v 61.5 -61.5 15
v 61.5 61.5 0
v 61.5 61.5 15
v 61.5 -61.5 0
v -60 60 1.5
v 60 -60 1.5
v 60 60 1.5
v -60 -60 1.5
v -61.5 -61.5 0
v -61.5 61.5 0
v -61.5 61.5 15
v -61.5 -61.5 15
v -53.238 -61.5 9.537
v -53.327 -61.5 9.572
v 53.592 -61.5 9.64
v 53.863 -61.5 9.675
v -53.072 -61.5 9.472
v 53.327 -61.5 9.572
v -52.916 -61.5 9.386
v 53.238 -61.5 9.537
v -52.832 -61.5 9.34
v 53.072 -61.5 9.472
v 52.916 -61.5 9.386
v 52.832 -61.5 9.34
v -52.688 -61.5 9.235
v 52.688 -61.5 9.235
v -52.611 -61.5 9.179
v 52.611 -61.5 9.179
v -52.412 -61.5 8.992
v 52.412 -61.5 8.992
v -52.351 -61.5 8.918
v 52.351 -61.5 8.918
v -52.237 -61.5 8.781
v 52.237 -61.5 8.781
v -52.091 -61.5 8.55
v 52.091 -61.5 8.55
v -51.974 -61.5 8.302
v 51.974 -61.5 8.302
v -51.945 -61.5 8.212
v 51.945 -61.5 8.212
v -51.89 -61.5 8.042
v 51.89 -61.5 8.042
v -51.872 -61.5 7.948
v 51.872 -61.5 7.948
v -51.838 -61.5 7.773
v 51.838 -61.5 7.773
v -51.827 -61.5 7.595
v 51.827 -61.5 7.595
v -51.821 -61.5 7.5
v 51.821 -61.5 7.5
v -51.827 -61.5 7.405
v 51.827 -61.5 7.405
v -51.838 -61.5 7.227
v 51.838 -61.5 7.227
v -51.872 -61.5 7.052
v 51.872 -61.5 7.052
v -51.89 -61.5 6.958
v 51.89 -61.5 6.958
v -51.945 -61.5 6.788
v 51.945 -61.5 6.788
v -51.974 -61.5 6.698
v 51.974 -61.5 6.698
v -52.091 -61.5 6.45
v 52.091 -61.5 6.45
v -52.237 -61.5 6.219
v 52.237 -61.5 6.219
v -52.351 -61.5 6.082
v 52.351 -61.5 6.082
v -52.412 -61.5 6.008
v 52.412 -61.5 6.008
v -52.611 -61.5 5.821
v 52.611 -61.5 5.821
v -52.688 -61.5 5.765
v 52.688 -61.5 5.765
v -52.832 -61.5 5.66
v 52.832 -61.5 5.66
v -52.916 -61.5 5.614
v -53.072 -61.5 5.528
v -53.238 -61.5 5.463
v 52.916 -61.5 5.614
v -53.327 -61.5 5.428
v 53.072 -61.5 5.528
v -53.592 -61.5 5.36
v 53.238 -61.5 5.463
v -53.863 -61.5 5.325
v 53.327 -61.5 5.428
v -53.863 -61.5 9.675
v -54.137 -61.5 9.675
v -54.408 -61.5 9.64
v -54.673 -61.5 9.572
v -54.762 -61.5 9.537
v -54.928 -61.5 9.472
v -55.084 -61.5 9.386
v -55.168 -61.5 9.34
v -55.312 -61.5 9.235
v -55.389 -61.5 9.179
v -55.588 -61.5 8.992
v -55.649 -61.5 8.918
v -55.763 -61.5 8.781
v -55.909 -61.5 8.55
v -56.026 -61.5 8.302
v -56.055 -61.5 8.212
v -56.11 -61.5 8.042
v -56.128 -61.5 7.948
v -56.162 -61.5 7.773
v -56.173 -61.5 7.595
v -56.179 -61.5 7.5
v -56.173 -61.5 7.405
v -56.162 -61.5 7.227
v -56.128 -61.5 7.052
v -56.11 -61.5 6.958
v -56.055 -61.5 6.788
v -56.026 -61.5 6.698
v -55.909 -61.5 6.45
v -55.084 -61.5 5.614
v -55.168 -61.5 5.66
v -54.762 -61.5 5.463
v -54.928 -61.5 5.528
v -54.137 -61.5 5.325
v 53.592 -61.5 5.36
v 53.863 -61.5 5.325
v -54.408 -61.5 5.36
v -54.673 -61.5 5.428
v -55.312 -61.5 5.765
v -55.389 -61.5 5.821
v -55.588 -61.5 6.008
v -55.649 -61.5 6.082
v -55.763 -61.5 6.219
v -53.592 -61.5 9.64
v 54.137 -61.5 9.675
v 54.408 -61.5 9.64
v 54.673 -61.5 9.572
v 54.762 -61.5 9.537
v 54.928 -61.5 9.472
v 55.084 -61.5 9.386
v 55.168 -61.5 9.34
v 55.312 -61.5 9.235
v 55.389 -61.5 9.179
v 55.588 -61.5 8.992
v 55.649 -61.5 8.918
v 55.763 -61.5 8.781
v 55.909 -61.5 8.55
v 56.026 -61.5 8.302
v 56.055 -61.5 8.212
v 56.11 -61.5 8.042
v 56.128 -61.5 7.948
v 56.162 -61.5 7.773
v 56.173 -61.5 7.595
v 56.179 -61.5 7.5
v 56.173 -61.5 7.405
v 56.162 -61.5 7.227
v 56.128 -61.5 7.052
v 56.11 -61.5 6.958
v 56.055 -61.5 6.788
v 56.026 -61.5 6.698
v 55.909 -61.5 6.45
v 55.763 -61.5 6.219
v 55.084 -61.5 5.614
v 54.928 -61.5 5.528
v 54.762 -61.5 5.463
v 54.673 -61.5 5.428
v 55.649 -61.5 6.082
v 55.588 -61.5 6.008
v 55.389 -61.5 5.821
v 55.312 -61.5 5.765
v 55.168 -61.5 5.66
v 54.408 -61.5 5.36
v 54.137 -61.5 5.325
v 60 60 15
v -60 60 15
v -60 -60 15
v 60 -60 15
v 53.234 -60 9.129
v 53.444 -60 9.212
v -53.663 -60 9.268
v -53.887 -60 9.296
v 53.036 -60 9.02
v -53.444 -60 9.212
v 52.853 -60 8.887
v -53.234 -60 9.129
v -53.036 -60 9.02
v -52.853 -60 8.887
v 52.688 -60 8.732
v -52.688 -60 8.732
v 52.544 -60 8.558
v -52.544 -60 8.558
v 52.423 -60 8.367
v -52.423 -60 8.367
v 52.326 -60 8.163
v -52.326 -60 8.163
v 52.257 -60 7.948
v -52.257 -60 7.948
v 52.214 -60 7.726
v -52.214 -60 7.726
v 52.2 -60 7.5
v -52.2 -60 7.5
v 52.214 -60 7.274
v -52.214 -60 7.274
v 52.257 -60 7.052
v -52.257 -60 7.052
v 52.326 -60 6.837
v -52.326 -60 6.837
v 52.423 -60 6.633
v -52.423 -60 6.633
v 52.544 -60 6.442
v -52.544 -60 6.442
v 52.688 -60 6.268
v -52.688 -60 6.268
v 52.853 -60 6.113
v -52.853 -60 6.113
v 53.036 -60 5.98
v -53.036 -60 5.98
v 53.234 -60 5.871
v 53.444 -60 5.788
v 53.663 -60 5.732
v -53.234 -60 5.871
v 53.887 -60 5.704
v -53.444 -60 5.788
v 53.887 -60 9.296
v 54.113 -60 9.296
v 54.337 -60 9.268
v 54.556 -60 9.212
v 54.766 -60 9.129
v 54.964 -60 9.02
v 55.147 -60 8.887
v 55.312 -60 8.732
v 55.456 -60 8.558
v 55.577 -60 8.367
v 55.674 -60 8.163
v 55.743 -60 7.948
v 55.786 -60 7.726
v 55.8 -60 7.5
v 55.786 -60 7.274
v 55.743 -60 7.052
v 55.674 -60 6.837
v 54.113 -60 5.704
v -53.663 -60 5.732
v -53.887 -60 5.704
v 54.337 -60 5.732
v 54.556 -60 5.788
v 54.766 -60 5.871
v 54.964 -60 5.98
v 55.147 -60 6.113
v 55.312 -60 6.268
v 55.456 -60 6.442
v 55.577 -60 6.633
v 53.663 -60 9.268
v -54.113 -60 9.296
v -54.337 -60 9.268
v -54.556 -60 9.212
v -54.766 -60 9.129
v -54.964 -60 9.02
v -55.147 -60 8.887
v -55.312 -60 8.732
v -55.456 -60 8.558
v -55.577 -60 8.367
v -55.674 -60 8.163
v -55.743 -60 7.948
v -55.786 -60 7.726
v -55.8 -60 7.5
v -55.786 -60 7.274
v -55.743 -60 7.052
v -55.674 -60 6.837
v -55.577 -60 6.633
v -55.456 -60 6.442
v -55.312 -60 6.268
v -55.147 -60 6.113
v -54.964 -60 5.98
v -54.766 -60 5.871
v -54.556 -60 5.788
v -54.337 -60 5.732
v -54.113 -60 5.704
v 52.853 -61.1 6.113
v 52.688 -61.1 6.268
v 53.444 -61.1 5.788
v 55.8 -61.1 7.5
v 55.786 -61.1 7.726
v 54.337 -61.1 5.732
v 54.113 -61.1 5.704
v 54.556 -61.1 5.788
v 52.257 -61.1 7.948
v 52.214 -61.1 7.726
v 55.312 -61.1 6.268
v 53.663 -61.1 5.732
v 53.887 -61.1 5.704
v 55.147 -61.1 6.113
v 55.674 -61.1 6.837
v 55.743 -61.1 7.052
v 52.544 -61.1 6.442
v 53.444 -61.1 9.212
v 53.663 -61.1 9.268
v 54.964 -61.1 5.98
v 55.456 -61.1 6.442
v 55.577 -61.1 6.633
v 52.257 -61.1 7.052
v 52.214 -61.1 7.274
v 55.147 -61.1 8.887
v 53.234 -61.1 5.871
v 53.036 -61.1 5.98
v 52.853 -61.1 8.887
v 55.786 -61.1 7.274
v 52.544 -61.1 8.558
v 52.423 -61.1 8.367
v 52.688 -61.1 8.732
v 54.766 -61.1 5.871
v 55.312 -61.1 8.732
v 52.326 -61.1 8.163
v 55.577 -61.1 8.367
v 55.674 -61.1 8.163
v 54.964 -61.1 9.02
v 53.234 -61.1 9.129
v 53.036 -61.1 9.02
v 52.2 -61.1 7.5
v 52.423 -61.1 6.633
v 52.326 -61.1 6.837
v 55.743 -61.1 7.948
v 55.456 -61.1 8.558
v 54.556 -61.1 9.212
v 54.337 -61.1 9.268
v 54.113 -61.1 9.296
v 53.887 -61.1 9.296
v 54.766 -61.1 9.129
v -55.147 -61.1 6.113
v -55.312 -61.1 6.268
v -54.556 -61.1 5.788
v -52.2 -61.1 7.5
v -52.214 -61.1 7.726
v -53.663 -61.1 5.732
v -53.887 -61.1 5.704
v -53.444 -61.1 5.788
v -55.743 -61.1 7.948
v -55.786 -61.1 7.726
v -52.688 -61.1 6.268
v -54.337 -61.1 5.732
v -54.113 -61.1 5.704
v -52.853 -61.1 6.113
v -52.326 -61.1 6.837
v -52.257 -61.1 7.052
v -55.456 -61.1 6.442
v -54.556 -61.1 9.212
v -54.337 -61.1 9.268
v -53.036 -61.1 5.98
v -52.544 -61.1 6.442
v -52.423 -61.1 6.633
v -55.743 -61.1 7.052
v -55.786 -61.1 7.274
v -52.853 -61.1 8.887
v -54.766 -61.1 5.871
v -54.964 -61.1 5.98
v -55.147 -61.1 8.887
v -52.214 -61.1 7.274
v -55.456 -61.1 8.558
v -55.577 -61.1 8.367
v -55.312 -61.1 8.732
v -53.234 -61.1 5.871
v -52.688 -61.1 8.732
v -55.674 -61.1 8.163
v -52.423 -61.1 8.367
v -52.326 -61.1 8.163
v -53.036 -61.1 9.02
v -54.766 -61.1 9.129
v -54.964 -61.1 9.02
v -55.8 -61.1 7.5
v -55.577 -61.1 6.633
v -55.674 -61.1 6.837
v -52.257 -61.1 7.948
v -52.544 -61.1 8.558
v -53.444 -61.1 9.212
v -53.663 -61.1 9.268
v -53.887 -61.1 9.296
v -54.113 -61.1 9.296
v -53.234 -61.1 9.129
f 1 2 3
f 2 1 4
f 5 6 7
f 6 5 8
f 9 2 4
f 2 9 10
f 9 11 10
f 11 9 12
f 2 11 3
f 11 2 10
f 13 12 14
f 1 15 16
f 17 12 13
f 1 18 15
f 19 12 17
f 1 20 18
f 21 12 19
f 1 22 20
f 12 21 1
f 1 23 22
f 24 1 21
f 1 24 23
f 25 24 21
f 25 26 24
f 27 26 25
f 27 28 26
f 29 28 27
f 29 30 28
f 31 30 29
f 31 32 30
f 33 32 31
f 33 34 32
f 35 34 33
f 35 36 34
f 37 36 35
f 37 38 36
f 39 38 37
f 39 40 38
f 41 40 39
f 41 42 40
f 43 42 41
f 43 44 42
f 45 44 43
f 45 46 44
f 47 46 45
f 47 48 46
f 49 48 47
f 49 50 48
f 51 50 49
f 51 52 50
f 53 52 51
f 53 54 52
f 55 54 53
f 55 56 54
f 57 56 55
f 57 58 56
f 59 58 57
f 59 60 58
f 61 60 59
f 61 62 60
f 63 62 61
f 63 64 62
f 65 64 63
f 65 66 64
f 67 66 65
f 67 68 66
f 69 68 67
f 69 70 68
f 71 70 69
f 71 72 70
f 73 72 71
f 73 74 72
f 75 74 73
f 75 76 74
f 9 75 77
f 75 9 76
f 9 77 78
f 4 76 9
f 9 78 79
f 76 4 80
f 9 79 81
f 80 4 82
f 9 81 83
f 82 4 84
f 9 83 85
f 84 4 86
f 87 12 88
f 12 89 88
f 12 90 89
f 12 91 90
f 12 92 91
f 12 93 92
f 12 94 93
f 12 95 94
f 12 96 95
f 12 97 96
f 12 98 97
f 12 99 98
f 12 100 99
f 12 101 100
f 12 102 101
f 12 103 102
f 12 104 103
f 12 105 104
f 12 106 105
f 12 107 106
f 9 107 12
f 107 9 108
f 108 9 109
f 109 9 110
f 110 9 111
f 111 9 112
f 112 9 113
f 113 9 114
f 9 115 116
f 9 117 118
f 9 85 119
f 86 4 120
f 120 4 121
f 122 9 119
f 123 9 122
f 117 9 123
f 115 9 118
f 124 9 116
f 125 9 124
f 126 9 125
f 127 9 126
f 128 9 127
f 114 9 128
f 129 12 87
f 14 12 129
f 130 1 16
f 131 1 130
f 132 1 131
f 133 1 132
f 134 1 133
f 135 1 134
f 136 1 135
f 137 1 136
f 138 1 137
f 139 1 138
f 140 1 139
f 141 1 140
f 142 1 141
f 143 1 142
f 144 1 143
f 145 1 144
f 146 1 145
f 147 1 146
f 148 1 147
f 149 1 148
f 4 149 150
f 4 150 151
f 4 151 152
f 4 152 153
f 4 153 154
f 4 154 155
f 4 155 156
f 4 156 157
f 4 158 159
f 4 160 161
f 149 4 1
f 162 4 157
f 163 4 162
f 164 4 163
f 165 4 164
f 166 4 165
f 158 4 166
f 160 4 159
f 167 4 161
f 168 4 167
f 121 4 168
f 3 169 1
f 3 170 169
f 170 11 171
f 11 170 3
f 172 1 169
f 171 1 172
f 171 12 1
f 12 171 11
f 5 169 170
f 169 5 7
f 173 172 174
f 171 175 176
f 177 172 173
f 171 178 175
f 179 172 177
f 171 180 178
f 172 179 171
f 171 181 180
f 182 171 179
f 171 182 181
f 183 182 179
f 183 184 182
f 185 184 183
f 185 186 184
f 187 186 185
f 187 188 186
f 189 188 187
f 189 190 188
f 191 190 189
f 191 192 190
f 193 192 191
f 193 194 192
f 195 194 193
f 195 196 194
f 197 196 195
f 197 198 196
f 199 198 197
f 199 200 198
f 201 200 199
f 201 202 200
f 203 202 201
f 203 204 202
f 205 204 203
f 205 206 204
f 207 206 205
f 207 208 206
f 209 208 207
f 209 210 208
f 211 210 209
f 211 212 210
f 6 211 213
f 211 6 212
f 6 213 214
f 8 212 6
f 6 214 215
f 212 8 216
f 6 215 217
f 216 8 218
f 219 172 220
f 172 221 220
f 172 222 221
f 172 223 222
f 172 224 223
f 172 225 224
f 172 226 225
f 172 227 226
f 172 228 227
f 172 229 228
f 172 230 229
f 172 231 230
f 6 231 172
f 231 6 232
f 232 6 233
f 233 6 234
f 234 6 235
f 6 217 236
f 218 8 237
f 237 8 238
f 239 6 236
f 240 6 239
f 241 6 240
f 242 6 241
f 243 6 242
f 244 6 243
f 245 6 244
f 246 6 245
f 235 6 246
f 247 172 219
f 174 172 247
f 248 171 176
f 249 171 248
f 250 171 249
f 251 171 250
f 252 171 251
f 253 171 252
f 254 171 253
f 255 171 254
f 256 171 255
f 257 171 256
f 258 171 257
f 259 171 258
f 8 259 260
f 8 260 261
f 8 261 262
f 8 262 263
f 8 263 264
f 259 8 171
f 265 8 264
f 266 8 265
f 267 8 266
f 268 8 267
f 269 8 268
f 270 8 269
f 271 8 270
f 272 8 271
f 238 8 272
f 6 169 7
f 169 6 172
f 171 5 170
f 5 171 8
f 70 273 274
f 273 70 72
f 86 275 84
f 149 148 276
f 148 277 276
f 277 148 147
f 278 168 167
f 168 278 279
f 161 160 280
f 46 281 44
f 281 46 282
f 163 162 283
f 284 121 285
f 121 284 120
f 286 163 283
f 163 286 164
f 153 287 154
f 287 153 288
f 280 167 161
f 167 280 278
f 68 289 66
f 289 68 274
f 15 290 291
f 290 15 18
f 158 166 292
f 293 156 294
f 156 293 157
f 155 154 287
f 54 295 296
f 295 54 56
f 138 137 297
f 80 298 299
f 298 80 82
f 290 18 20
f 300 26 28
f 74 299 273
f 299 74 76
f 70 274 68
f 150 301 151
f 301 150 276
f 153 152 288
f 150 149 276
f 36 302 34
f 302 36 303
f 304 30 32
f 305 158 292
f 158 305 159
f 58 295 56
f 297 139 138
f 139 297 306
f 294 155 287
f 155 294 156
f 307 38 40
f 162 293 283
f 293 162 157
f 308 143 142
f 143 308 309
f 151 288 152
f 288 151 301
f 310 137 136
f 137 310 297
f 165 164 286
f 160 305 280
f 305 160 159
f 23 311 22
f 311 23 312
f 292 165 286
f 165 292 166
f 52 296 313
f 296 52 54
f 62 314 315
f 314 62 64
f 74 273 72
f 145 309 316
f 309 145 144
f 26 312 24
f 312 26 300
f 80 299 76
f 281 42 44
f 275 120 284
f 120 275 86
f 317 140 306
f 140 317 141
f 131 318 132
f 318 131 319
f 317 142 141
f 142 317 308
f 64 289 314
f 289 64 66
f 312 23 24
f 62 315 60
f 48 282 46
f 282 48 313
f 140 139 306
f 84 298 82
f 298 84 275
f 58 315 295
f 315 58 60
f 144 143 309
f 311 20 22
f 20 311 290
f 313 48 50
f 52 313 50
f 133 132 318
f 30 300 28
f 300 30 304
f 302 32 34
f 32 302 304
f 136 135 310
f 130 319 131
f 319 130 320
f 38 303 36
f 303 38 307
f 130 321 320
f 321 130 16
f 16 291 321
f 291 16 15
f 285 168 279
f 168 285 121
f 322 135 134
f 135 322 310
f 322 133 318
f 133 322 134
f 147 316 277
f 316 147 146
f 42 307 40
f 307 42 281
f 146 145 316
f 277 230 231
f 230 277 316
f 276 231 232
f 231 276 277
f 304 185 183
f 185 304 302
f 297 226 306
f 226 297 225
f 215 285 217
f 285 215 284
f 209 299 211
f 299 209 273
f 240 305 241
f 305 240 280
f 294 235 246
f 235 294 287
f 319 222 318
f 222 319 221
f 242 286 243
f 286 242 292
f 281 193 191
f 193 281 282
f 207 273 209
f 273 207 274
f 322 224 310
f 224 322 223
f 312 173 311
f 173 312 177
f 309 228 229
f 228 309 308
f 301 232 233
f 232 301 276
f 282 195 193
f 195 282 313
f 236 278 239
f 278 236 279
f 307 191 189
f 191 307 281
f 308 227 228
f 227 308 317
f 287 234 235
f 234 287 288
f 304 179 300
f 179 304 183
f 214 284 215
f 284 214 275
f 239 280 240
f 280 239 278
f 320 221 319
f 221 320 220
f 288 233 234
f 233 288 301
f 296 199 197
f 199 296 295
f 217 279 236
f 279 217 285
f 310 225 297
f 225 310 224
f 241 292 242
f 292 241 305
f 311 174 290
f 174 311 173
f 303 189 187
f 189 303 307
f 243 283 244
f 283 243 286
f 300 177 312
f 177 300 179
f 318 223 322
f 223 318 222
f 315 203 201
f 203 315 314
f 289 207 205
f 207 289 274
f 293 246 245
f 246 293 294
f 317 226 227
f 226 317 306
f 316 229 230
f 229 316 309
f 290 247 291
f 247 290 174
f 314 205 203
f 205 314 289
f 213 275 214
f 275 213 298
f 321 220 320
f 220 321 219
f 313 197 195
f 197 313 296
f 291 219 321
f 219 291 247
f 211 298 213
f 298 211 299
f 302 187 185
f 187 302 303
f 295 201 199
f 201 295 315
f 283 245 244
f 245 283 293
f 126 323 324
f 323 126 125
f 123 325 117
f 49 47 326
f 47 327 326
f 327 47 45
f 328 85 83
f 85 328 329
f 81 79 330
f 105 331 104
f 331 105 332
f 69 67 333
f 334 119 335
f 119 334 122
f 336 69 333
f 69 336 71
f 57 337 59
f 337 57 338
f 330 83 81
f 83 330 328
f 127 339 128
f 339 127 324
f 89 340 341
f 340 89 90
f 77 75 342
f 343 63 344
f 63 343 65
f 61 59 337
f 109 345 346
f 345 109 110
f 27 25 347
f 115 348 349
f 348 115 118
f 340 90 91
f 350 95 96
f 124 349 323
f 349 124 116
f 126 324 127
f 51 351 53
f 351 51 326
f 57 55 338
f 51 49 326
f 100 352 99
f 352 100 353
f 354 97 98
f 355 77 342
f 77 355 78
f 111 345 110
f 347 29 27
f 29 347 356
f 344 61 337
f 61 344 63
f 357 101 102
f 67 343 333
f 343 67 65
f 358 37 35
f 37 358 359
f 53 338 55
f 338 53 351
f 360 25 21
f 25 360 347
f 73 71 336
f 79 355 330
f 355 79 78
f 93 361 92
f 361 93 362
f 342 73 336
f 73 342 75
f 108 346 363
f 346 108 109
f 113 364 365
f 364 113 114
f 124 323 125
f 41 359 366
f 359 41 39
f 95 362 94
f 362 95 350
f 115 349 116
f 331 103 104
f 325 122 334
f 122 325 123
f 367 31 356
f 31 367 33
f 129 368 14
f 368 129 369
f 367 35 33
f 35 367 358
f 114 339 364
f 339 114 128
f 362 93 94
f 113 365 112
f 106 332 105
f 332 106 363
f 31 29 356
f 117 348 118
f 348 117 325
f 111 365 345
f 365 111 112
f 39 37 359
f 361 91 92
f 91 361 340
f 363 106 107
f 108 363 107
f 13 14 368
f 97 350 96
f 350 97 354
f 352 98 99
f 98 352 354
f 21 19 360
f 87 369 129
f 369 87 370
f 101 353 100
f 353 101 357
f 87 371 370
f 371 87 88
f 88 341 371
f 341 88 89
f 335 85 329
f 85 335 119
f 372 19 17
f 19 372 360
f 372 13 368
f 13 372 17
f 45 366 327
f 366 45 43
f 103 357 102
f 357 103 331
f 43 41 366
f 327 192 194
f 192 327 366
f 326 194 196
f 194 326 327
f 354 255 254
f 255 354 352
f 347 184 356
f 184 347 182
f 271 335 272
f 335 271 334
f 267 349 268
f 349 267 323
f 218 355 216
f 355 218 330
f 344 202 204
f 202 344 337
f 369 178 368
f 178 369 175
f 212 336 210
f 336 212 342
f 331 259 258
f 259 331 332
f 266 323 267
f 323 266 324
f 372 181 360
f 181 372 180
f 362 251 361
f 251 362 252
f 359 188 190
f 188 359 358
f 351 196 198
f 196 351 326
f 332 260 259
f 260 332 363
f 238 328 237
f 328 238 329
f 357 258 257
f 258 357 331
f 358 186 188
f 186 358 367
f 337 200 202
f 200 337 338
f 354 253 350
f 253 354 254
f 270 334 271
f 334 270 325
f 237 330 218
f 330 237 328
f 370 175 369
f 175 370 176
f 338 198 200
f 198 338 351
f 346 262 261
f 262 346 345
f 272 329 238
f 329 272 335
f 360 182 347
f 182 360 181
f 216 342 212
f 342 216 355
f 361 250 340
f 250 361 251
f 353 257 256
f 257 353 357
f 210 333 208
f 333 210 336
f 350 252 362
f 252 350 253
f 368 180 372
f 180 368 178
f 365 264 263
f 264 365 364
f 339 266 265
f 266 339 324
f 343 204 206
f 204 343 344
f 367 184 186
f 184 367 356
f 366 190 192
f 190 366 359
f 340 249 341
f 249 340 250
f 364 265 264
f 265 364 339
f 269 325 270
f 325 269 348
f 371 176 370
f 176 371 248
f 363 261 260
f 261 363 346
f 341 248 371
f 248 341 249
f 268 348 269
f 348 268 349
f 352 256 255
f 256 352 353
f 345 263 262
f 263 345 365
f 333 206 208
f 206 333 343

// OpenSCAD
$fn = 50;


difference() {
	union() {
		translate(v = [-61.5000000000, -61.5000000000, 0]) {
			cube(size = [123, 123, 1.5000000000]);
		}
		translate(v = [-61.5000000000, 60.0000000000, 0]) {
			cube(size = [123, 1.5000000000, 15]);
		}
		translate(v = [-61.5000000000, -61.5000000000, 0]) {
			cube(size = [123, 1.5000000000, 15]);
		}
		translate(v = [60.0000000000, -61.5000000000, 0]) {
			cube(size = [1.5000000000, 123, 15]);
		}
		translate(v = [-61.5000000000, -61.5000000000, 0]) {
			cube(size = [1.5000000000, 123, 15]);
		}
	}
	union() {
		translate(v = [54.0000000000, -63.0000000000, 7.5000000000]) {
			rotate(a = [90, 0, 0]) {
				difference() {
					union() {
						#translate(v = [0, 0, -15.0000000000]) {
							cylinder(h = 15, r = 1.5000000000);
						}
						#translate(v = [0, 0, -1.9000000000]) {
							cylinder(h = 1.9000000000, r1 = 1.8000000000, r2 = 3.6000000000);
						}
						#translate(v = [0, 0, -15.0000000000]) {
							cylinder(h = 15, r = 1.8000000000);
						}
						#translate(v = [0, 0, -15.0000000000]) {
							cylinder(h = 15, r = 1.5000000000);
						}
					}
					union();
				}
			}
		}
		translate(v = [-54.0000000000, -63.0000000000, 7.5000000000]) {
			rotate(a = [90, 0, 0]) {
				difference() {
					union() {
						#translate(v = [0, 0, -15.0000000000]) {
							cylinder(h = 15, r = 1.5000000000);
						}
						#translate(v = [0, 0, -1.9000000000]) {
							cylinder(h = 1.9000000000, r1 = 1.8000000000, r2 = 3.6000000000);
						}
						#translate(v = [0, 0, -15.0000000000]) {
							cylinder(h = 15, r = 1.8000000000);
						}
						#translate(v = [0, 0, -15.0000000000]) {
							cylinder(h = 15, r = 1.5000000000);
						}
					}
					union();
				}
			}
		}
		translate(v = [54.0000000000, -63.0000000000, 7.5000000000]) {
			rotate(a = [90, 0, 0]) {
				difference() {
					union() {
						#translate(v = [0, 0, -15.0000000000]) {
							cylinder(h = 15, r = 1.5000000000);
						}
						#translate(v = [0, 0, -1.9000000000]) {
							cylinder(h = 1.9000000000, r1 = 1.8000000000, r2 = 3.6000000000);
						}
						#translate(v = [0, 0, -15.0000000000]) {
							cylinder(h = 15, r = 1.8000000000);
						}
						#translate(v = [0, 0, -15.0000000000]) {
							cylinder(h = 15, r = 1.5000000000);
						}
					}
					union();
				}
			}
		}
		translate(v = [-54.0000000000, -63.0000000000, 7.5000000000]) {
			rotate(a = [90, 0, 0]) {
				difference() {
					union() {
						#translate(v = [0, 0, -15.0000000000]) {
							cylinder(h = 15, r = 1.5000000000);
						}
						#translate(v = [0, 0, -1.9000000000]) {
							cylinder(h = 1.9000000000, r1 = 1.8000000000, r2 = 3.6000000000);
						}
						#translate(v = [0, 0, -15.0000000000]) {
							cylinder(h = 15, r = 1.8000000000);
						}
						#translate(v = [0, 0, -15.0000000000]) {
							cylinder(h = 15, r = 1.5000000000);
						}
					}
					union();
				}
			}
		}
	}
}
